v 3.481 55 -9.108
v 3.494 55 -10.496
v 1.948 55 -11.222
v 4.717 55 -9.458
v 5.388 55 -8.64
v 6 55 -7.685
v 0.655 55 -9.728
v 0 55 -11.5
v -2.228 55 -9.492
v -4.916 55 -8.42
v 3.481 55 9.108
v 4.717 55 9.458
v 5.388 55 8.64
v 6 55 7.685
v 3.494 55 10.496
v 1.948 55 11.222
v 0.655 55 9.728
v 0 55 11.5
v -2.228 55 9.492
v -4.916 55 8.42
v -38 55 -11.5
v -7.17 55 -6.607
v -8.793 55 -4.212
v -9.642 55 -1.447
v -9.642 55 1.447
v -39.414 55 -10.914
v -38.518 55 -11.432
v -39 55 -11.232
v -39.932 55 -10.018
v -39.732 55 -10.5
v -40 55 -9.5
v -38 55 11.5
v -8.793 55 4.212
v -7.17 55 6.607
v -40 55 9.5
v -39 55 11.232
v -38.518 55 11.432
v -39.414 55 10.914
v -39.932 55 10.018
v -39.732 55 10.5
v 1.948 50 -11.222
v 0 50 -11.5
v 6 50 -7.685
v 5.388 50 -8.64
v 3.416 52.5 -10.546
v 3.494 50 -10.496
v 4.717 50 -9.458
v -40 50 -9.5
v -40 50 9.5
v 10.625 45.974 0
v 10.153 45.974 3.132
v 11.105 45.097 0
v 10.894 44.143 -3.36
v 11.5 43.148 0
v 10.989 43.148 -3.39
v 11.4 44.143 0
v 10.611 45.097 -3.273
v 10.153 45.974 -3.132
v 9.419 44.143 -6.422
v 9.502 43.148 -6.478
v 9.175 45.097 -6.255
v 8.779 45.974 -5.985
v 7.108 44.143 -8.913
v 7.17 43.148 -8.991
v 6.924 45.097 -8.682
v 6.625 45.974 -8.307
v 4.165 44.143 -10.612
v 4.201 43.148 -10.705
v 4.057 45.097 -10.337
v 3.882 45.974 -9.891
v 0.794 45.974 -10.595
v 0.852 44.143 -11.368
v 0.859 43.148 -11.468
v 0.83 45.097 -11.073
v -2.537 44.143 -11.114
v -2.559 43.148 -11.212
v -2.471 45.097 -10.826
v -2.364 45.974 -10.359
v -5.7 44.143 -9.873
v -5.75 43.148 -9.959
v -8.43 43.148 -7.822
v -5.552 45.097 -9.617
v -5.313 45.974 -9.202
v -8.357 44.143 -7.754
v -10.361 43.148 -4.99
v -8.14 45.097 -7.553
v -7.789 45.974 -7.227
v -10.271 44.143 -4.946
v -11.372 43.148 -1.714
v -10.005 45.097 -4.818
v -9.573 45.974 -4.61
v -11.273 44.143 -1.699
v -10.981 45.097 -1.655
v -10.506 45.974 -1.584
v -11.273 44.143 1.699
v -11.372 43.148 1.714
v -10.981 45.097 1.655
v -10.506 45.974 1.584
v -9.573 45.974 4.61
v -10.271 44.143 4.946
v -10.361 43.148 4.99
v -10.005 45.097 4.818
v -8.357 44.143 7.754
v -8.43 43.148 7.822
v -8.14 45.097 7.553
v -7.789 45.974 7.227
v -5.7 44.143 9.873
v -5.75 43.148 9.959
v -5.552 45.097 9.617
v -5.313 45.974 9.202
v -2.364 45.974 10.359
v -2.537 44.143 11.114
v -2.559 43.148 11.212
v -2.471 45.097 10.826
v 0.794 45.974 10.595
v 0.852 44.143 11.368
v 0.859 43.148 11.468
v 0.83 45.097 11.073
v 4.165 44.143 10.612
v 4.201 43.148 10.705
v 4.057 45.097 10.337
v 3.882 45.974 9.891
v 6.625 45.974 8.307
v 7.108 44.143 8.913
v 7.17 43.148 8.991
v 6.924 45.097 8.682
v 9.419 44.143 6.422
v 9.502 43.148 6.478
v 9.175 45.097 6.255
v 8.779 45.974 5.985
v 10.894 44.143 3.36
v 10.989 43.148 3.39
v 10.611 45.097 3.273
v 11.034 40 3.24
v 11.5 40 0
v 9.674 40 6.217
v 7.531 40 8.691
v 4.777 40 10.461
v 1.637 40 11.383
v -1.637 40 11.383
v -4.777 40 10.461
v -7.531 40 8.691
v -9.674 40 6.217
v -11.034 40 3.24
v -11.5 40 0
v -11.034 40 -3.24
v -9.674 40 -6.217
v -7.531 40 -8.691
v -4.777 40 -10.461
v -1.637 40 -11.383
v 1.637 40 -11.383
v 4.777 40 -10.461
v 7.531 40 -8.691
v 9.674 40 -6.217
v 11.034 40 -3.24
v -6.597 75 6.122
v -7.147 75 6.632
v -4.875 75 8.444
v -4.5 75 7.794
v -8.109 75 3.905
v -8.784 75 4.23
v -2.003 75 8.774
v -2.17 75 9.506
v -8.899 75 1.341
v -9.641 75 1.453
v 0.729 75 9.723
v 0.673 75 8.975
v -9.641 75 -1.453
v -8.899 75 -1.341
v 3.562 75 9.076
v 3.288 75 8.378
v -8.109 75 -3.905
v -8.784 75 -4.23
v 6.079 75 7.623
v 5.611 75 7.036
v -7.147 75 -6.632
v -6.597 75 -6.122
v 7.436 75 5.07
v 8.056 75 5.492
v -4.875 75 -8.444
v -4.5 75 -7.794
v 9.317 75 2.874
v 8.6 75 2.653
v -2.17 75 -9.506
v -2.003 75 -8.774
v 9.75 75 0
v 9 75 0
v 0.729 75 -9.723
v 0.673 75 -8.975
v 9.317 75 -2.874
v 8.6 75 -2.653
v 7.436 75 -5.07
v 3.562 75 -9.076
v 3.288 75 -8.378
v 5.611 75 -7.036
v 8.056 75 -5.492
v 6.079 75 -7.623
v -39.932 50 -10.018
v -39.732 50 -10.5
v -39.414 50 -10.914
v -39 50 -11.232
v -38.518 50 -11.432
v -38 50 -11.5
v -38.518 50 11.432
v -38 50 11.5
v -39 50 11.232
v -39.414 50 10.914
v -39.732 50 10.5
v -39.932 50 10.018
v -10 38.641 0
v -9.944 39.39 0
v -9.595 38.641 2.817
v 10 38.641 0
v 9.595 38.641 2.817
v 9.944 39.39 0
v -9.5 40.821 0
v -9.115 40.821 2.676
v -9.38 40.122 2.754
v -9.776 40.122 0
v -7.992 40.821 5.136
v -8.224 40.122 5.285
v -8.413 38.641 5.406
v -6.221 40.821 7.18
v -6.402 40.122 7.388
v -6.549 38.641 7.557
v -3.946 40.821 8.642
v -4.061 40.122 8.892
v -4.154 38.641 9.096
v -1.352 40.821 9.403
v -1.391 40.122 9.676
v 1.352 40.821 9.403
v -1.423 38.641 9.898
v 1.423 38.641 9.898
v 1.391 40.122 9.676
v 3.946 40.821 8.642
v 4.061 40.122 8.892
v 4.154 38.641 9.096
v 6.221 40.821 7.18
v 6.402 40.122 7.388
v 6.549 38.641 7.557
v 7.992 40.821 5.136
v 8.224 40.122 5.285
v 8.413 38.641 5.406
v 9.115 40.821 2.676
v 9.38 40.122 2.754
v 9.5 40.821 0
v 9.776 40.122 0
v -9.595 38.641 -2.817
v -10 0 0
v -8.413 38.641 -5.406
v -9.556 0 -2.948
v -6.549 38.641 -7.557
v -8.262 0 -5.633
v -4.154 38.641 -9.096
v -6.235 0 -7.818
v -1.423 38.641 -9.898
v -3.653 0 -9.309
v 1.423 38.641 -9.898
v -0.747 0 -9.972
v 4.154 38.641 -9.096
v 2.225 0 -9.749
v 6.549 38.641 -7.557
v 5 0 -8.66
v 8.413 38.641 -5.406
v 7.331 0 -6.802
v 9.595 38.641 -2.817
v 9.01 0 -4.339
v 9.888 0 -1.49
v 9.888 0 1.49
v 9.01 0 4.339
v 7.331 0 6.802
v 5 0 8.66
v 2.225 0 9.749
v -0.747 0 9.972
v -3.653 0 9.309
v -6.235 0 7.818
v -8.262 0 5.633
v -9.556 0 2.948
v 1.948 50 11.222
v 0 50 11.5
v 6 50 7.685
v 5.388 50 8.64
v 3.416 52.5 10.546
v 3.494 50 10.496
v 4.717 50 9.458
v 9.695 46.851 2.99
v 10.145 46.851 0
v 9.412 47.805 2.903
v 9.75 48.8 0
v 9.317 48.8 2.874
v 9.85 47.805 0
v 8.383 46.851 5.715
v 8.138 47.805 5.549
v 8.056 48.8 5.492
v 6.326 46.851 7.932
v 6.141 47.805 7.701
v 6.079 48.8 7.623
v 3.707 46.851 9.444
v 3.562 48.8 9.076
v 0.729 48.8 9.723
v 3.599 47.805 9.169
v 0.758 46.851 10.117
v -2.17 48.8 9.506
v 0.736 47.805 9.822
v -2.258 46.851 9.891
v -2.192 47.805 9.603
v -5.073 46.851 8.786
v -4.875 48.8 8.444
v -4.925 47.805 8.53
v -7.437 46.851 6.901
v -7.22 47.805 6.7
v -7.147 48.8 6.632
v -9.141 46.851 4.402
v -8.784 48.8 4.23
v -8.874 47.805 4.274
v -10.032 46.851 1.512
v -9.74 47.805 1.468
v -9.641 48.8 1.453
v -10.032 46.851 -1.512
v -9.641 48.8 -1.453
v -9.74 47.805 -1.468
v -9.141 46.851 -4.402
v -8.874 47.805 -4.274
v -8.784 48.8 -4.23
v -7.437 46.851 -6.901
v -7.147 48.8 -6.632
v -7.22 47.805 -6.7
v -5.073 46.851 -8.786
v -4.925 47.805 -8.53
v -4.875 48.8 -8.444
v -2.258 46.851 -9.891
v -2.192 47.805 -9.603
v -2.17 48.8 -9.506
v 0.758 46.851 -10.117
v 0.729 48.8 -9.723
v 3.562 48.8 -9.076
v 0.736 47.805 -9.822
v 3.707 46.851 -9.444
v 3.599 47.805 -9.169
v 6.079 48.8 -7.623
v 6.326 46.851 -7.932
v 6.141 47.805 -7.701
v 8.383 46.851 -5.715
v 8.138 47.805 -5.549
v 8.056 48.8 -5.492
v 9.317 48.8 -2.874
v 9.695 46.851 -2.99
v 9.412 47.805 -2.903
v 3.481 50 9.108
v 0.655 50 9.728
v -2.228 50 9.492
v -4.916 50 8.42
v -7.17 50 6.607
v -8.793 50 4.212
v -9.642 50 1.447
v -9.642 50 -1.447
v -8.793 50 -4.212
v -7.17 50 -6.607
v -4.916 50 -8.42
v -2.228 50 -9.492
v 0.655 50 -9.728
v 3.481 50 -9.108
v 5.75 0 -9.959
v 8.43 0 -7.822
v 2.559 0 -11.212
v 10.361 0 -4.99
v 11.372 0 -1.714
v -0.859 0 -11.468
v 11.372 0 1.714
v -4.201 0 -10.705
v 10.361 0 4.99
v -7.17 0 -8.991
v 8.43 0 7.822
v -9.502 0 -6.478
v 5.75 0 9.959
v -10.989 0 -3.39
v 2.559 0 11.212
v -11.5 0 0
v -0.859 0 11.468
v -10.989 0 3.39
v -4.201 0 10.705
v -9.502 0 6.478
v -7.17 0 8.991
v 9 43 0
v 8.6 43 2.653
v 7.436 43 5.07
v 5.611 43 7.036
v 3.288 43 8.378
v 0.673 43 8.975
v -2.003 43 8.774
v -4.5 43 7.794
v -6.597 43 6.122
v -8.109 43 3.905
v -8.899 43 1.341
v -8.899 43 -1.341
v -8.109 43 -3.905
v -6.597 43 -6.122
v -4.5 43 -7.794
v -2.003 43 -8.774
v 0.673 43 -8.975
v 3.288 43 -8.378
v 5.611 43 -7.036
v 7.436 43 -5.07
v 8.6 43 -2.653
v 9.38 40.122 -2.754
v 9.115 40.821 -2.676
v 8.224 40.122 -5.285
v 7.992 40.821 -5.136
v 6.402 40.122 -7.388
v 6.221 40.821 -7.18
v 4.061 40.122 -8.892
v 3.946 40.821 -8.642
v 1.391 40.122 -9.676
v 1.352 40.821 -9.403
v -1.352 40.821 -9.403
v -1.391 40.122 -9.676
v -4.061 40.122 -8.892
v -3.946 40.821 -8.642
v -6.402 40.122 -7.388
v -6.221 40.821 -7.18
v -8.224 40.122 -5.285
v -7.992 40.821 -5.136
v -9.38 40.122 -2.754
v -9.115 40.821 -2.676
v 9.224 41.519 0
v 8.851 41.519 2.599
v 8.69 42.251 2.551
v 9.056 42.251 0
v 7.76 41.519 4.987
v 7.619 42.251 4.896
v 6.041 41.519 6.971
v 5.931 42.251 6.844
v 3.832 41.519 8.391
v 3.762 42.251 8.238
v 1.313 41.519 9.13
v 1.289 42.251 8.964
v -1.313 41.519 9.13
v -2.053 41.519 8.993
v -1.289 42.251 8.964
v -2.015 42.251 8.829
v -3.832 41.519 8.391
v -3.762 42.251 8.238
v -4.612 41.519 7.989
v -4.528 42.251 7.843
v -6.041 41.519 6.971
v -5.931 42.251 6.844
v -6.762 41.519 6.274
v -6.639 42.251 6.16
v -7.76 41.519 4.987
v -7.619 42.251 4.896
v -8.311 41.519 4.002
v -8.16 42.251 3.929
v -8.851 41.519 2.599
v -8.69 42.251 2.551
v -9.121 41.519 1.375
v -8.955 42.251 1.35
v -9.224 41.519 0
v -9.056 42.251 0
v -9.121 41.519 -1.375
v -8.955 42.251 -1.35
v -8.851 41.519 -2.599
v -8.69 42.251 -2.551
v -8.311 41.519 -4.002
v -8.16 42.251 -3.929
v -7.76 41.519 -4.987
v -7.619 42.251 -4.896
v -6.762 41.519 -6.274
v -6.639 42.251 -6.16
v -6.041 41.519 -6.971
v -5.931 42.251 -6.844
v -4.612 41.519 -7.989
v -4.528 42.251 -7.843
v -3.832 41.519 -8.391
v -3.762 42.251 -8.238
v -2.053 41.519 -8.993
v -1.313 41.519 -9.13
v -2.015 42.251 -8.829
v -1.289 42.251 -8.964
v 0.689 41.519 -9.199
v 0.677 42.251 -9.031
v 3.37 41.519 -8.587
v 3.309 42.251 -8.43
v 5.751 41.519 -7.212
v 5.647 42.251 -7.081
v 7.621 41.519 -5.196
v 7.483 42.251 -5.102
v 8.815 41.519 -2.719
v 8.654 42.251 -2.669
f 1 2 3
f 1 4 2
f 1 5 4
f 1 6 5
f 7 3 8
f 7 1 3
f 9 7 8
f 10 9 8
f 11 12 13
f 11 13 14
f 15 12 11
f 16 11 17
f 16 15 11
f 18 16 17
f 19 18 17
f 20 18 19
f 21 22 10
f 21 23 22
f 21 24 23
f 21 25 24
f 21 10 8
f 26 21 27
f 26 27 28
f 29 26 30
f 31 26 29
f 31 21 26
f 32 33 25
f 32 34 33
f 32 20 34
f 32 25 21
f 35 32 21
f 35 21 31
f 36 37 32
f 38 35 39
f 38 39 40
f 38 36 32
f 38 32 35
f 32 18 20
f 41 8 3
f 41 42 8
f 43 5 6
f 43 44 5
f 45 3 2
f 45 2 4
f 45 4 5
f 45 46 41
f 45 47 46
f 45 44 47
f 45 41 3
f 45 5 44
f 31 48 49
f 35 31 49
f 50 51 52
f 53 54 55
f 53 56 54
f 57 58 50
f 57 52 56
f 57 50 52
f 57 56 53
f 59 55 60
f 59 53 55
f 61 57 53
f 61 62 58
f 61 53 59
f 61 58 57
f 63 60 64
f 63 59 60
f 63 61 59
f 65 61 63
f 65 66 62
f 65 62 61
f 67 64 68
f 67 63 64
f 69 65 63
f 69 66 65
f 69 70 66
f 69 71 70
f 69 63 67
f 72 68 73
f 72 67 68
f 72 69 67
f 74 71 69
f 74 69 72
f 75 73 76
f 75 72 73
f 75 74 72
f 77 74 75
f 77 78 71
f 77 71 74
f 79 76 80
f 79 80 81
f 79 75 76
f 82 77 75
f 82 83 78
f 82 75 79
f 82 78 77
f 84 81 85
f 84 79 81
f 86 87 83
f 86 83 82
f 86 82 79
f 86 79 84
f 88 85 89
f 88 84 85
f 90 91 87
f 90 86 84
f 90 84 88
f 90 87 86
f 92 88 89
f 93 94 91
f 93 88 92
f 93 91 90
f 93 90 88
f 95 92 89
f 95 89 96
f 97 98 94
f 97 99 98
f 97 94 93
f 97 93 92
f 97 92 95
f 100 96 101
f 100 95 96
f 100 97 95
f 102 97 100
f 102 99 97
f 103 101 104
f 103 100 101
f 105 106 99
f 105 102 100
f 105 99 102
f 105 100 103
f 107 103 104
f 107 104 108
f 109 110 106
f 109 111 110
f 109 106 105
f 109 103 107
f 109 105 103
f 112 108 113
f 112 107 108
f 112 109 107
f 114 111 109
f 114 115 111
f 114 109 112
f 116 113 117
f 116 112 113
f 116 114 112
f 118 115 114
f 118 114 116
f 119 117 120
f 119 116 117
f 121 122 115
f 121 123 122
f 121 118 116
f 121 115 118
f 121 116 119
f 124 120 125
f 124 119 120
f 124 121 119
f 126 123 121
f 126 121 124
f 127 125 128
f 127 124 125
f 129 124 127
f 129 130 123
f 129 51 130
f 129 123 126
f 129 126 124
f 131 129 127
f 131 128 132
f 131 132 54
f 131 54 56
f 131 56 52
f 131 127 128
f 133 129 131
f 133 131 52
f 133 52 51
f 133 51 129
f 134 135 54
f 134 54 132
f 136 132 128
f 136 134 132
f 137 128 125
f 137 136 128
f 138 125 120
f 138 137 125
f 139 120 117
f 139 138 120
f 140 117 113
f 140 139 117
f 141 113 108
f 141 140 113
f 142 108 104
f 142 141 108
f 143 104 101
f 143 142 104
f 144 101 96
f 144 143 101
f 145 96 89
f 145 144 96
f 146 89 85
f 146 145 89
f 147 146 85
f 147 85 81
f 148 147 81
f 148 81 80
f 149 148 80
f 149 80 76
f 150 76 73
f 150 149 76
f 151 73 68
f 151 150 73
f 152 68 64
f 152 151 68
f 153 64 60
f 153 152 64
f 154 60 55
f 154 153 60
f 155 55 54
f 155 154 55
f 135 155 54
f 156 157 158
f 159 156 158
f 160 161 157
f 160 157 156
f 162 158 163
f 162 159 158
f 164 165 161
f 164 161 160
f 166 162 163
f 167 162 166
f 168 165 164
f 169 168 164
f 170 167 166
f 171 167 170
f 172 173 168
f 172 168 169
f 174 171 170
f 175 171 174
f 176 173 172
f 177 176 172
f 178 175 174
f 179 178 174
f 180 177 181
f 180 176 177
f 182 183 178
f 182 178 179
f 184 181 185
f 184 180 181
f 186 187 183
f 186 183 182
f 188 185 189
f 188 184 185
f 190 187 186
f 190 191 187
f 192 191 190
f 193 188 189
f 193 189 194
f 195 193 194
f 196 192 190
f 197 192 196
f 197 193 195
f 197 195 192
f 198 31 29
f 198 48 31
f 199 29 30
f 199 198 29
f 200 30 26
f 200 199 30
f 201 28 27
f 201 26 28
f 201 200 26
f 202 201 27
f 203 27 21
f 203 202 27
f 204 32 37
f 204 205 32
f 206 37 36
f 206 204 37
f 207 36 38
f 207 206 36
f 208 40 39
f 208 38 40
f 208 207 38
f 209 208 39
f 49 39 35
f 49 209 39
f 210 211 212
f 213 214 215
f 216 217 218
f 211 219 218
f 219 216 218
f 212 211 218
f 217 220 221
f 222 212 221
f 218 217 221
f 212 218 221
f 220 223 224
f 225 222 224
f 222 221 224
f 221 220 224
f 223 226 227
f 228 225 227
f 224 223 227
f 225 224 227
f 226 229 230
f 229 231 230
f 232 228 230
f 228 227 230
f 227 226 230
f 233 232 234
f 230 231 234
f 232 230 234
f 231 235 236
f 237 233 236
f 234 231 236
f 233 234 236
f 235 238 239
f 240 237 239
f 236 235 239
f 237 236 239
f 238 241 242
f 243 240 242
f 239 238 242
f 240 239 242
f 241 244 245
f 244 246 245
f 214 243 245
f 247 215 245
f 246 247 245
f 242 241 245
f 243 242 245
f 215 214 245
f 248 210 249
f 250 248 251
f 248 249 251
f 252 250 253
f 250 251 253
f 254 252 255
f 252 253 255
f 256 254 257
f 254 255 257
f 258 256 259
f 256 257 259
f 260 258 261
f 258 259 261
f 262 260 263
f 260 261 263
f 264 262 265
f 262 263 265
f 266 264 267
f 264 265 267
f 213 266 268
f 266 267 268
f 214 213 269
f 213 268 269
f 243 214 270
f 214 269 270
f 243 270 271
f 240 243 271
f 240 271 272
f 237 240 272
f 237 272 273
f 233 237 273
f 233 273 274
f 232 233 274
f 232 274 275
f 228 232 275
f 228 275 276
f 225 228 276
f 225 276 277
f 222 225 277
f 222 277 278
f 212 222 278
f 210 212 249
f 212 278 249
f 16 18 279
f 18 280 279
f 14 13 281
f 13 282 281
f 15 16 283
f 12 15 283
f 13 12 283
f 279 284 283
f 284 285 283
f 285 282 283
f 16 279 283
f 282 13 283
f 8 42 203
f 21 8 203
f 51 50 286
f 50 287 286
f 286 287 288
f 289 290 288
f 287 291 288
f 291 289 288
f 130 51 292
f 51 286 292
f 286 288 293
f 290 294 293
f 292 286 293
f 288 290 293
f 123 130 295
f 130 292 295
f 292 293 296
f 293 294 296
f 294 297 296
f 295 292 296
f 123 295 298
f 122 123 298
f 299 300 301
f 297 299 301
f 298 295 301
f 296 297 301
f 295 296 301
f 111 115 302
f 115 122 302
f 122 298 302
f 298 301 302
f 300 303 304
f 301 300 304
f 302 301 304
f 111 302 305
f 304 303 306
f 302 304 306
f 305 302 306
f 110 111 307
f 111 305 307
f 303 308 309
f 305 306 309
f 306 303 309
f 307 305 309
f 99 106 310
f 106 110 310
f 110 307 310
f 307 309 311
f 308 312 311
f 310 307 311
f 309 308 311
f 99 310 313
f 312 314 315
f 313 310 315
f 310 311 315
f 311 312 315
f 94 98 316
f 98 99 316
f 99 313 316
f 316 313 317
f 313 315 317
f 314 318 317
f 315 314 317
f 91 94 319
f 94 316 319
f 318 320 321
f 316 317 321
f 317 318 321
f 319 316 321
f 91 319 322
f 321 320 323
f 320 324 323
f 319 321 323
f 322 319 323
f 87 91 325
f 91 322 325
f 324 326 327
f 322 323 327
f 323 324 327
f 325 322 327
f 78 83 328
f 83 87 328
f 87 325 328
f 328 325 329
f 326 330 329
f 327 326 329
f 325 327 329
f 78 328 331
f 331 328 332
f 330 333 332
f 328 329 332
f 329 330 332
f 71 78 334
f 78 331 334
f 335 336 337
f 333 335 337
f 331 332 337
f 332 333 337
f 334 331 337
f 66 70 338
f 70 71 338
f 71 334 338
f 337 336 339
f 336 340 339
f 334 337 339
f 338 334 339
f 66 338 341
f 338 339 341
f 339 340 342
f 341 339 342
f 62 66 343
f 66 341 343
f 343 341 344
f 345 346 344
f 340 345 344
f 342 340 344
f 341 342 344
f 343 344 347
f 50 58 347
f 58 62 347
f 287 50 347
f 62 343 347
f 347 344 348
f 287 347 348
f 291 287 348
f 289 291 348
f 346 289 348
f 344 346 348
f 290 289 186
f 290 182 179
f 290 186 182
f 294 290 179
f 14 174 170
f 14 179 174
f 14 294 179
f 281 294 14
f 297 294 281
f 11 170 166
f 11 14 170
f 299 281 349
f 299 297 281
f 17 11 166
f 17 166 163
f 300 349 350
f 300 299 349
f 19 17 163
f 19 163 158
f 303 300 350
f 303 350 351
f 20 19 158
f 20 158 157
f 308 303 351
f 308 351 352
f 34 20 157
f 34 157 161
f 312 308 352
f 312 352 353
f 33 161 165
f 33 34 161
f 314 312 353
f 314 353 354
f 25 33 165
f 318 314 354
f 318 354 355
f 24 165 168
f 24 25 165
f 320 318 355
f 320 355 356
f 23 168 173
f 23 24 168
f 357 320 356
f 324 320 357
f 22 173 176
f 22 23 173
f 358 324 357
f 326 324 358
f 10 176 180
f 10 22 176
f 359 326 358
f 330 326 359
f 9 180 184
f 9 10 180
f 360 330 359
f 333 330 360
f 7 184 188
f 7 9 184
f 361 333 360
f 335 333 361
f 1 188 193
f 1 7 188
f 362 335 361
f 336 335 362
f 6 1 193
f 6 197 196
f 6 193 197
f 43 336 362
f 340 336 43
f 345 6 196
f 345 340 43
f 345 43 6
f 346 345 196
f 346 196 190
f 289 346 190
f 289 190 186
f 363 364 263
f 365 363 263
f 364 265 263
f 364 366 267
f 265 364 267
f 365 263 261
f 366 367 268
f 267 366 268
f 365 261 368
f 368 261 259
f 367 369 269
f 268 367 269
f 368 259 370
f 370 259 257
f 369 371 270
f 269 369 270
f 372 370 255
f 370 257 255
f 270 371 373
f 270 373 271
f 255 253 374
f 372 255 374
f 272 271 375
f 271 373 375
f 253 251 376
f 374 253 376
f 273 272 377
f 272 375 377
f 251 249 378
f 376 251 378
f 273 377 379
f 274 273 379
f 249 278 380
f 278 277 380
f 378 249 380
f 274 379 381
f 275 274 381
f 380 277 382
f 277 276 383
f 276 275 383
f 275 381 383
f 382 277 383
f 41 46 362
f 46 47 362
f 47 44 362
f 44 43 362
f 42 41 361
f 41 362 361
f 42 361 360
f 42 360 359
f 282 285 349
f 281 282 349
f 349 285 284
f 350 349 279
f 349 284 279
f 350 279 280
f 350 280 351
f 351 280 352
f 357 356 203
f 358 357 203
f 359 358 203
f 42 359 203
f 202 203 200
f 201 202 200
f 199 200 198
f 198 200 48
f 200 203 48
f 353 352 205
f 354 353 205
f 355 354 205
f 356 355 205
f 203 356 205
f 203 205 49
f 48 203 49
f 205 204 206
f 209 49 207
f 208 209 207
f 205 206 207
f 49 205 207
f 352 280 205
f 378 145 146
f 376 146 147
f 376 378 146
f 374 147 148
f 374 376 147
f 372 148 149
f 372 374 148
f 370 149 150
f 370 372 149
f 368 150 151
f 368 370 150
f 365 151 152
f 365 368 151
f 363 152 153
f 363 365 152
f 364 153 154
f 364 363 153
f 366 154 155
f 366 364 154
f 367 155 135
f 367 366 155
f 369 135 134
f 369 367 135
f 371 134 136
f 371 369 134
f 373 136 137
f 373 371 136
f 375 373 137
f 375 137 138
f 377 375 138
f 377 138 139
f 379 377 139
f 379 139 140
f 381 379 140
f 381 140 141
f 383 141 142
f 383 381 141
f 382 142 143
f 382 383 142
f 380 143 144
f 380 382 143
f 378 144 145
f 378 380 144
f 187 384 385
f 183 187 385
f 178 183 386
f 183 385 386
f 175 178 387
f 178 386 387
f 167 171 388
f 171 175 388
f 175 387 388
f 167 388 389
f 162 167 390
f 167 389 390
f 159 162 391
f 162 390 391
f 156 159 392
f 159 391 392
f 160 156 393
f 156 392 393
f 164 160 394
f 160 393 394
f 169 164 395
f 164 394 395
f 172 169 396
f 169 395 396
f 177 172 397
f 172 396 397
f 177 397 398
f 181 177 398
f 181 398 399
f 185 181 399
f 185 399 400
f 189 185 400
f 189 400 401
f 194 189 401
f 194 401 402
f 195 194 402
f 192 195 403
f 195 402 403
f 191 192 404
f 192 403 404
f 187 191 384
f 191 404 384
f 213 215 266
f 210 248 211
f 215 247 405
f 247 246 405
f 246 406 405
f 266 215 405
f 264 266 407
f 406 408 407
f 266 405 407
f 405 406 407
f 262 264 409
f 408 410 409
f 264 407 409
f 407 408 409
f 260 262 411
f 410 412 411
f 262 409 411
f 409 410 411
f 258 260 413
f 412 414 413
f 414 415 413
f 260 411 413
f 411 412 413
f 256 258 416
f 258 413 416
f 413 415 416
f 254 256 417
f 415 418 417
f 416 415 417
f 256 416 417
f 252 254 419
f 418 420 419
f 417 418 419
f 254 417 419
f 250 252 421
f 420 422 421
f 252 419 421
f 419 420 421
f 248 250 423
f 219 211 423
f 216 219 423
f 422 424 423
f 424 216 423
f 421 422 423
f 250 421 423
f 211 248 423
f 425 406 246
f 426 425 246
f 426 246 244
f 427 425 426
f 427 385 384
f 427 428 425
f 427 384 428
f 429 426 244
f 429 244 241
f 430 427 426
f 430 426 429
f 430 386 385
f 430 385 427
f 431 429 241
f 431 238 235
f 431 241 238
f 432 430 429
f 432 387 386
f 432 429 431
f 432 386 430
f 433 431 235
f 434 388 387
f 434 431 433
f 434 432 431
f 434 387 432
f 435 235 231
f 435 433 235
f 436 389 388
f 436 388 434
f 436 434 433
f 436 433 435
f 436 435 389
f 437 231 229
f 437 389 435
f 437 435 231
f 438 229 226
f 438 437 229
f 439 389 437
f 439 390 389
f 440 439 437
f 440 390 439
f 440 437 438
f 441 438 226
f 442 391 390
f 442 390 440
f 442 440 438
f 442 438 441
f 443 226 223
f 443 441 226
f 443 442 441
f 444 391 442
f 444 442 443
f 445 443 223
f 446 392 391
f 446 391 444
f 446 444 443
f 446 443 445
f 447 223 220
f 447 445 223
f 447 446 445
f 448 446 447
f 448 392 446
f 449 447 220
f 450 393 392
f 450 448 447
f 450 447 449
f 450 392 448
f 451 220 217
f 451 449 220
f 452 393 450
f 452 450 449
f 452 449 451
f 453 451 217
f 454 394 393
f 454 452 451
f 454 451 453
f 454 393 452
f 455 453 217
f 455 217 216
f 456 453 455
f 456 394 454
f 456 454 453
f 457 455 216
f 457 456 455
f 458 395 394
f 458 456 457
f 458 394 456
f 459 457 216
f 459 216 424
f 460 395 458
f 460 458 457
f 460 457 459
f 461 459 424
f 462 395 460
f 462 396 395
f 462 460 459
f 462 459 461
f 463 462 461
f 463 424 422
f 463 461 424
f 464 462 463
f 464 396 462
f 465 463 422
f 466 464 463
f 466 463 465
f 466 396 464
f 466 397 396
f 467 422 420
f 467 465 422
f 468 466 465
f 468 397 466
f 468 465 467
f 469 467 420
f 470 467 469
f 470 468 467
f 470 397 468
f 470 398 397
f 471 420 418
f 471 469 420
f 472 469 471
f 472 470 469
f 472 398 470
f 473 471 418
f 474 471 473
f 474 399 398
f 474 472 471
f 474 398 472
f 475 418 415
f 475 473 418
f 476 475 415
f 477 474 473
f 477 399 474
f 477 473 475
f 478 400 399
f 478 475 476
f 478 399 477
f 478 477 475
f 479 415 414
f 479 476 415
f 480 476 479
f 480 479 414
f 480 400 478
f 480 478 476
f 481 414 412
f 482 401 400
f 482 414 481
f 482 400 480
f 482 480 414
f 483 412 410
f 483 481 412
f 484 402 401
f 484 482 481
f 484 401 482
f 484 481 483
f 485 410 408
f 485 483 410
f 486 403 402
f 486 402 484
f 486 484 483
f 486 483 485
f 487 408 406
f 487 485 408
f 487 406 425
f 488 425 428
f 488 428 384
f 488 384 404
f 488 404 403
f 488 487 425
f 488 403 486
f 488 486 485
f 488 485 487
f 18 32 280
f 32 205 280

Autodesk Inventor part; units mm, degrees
ref_plane "YZ Plane" through (0, 0, 0) normal (1, 0, 0) x (0, 1, 0)
ref_plane "XY Plane" through (0, 0, 0) normal (0, 0, 1) x (1, 0, 0)
sketch "Sketch1" plane through (0, 0, 0) normal (0, 1, 0) x (-1, 0, 0)
  circle A0 centre (0, 0) radius 10
  circle A1 centre (0, 0) radius 11.5
  dimension "d0" = 20
  dimension "d1" = 23
extrude "Extrusion1" add sketch "Sketch1" along normal blind 40
sketch "Sketch2" plane through (0, 40, 0) normal (0, 1, 0) x (1, 0, 0)
  circle A0 centre (0, 0) radius 9.75
  circle A1 centre (0, 0) radius 9
  dimension "d4" = 19.5
extrude "Extrusion2" add sketch "Sketch2" along normal blind 35
sketch "Sketch3" plane through (0, 40, 0) normal (0, 1, 0) x (1, 0, 0)
  circle A0 centre (0, 0) radius 9.75 projected
  circle A1 centre (0, 0) radius 11.5 projected
extrude "Extrusion3" add sketch "Sketch3" along normal blind 5
fillet "Fillet1" radius 5 2 edges at (-9.75, 45, 0) (-11.5, 45, 0)
fillet "Fillet2" radius 5 2 edges at (-9, 40, 0) (10, 40, 0)
ref_plane "Work Plane1" through (0, 50, 0) normal (0, 1, 0) x (-1, 0, 0)
sketch "Sketch4" plane through (0, 50, 0) normal (0, 1, 0) x (-1, 0, 0)
  circle A0 centre (0, 0) radius 11.5 projected
  line L0 (0, -11.5) -> (38, -11.5)
  line L1 (40, -9.5) -> (40, 9.5)
  line L2 (38, 11.5) -> (0, 11.5)
  arc A1 (40, 9.5) -> (38, 11.5) centre (38, 9.5) ccw
  arc A2 (38, -11.5) -> (40, -9.5) centre (38, -9.5) ccw
  circle A3 centre (0, 0) radius 9.75 projected
  spline S0 degree 2 poles (0, -11.5) (-3.8325, -11.5) (-6, -7.6852) knots 0 0 0 1 1 1
  spline S1 degree 2 poles (0, 11.5) (-3.8325, 11.5) (-6, 7.6852) knots 0 0 0 1 1 1
  point P0 (40, -11.5)
  dimension "d19" = 40
  dimension "d20" = 2
extrude "Extrusion5" add sketch "Sketch4" along normal blind 5 contours A0 S0 A3 S1 | A0 L2 A1 L1 A2 L0 picked at (10.8206, -0.853)
properties part number "Elbow Extension"
